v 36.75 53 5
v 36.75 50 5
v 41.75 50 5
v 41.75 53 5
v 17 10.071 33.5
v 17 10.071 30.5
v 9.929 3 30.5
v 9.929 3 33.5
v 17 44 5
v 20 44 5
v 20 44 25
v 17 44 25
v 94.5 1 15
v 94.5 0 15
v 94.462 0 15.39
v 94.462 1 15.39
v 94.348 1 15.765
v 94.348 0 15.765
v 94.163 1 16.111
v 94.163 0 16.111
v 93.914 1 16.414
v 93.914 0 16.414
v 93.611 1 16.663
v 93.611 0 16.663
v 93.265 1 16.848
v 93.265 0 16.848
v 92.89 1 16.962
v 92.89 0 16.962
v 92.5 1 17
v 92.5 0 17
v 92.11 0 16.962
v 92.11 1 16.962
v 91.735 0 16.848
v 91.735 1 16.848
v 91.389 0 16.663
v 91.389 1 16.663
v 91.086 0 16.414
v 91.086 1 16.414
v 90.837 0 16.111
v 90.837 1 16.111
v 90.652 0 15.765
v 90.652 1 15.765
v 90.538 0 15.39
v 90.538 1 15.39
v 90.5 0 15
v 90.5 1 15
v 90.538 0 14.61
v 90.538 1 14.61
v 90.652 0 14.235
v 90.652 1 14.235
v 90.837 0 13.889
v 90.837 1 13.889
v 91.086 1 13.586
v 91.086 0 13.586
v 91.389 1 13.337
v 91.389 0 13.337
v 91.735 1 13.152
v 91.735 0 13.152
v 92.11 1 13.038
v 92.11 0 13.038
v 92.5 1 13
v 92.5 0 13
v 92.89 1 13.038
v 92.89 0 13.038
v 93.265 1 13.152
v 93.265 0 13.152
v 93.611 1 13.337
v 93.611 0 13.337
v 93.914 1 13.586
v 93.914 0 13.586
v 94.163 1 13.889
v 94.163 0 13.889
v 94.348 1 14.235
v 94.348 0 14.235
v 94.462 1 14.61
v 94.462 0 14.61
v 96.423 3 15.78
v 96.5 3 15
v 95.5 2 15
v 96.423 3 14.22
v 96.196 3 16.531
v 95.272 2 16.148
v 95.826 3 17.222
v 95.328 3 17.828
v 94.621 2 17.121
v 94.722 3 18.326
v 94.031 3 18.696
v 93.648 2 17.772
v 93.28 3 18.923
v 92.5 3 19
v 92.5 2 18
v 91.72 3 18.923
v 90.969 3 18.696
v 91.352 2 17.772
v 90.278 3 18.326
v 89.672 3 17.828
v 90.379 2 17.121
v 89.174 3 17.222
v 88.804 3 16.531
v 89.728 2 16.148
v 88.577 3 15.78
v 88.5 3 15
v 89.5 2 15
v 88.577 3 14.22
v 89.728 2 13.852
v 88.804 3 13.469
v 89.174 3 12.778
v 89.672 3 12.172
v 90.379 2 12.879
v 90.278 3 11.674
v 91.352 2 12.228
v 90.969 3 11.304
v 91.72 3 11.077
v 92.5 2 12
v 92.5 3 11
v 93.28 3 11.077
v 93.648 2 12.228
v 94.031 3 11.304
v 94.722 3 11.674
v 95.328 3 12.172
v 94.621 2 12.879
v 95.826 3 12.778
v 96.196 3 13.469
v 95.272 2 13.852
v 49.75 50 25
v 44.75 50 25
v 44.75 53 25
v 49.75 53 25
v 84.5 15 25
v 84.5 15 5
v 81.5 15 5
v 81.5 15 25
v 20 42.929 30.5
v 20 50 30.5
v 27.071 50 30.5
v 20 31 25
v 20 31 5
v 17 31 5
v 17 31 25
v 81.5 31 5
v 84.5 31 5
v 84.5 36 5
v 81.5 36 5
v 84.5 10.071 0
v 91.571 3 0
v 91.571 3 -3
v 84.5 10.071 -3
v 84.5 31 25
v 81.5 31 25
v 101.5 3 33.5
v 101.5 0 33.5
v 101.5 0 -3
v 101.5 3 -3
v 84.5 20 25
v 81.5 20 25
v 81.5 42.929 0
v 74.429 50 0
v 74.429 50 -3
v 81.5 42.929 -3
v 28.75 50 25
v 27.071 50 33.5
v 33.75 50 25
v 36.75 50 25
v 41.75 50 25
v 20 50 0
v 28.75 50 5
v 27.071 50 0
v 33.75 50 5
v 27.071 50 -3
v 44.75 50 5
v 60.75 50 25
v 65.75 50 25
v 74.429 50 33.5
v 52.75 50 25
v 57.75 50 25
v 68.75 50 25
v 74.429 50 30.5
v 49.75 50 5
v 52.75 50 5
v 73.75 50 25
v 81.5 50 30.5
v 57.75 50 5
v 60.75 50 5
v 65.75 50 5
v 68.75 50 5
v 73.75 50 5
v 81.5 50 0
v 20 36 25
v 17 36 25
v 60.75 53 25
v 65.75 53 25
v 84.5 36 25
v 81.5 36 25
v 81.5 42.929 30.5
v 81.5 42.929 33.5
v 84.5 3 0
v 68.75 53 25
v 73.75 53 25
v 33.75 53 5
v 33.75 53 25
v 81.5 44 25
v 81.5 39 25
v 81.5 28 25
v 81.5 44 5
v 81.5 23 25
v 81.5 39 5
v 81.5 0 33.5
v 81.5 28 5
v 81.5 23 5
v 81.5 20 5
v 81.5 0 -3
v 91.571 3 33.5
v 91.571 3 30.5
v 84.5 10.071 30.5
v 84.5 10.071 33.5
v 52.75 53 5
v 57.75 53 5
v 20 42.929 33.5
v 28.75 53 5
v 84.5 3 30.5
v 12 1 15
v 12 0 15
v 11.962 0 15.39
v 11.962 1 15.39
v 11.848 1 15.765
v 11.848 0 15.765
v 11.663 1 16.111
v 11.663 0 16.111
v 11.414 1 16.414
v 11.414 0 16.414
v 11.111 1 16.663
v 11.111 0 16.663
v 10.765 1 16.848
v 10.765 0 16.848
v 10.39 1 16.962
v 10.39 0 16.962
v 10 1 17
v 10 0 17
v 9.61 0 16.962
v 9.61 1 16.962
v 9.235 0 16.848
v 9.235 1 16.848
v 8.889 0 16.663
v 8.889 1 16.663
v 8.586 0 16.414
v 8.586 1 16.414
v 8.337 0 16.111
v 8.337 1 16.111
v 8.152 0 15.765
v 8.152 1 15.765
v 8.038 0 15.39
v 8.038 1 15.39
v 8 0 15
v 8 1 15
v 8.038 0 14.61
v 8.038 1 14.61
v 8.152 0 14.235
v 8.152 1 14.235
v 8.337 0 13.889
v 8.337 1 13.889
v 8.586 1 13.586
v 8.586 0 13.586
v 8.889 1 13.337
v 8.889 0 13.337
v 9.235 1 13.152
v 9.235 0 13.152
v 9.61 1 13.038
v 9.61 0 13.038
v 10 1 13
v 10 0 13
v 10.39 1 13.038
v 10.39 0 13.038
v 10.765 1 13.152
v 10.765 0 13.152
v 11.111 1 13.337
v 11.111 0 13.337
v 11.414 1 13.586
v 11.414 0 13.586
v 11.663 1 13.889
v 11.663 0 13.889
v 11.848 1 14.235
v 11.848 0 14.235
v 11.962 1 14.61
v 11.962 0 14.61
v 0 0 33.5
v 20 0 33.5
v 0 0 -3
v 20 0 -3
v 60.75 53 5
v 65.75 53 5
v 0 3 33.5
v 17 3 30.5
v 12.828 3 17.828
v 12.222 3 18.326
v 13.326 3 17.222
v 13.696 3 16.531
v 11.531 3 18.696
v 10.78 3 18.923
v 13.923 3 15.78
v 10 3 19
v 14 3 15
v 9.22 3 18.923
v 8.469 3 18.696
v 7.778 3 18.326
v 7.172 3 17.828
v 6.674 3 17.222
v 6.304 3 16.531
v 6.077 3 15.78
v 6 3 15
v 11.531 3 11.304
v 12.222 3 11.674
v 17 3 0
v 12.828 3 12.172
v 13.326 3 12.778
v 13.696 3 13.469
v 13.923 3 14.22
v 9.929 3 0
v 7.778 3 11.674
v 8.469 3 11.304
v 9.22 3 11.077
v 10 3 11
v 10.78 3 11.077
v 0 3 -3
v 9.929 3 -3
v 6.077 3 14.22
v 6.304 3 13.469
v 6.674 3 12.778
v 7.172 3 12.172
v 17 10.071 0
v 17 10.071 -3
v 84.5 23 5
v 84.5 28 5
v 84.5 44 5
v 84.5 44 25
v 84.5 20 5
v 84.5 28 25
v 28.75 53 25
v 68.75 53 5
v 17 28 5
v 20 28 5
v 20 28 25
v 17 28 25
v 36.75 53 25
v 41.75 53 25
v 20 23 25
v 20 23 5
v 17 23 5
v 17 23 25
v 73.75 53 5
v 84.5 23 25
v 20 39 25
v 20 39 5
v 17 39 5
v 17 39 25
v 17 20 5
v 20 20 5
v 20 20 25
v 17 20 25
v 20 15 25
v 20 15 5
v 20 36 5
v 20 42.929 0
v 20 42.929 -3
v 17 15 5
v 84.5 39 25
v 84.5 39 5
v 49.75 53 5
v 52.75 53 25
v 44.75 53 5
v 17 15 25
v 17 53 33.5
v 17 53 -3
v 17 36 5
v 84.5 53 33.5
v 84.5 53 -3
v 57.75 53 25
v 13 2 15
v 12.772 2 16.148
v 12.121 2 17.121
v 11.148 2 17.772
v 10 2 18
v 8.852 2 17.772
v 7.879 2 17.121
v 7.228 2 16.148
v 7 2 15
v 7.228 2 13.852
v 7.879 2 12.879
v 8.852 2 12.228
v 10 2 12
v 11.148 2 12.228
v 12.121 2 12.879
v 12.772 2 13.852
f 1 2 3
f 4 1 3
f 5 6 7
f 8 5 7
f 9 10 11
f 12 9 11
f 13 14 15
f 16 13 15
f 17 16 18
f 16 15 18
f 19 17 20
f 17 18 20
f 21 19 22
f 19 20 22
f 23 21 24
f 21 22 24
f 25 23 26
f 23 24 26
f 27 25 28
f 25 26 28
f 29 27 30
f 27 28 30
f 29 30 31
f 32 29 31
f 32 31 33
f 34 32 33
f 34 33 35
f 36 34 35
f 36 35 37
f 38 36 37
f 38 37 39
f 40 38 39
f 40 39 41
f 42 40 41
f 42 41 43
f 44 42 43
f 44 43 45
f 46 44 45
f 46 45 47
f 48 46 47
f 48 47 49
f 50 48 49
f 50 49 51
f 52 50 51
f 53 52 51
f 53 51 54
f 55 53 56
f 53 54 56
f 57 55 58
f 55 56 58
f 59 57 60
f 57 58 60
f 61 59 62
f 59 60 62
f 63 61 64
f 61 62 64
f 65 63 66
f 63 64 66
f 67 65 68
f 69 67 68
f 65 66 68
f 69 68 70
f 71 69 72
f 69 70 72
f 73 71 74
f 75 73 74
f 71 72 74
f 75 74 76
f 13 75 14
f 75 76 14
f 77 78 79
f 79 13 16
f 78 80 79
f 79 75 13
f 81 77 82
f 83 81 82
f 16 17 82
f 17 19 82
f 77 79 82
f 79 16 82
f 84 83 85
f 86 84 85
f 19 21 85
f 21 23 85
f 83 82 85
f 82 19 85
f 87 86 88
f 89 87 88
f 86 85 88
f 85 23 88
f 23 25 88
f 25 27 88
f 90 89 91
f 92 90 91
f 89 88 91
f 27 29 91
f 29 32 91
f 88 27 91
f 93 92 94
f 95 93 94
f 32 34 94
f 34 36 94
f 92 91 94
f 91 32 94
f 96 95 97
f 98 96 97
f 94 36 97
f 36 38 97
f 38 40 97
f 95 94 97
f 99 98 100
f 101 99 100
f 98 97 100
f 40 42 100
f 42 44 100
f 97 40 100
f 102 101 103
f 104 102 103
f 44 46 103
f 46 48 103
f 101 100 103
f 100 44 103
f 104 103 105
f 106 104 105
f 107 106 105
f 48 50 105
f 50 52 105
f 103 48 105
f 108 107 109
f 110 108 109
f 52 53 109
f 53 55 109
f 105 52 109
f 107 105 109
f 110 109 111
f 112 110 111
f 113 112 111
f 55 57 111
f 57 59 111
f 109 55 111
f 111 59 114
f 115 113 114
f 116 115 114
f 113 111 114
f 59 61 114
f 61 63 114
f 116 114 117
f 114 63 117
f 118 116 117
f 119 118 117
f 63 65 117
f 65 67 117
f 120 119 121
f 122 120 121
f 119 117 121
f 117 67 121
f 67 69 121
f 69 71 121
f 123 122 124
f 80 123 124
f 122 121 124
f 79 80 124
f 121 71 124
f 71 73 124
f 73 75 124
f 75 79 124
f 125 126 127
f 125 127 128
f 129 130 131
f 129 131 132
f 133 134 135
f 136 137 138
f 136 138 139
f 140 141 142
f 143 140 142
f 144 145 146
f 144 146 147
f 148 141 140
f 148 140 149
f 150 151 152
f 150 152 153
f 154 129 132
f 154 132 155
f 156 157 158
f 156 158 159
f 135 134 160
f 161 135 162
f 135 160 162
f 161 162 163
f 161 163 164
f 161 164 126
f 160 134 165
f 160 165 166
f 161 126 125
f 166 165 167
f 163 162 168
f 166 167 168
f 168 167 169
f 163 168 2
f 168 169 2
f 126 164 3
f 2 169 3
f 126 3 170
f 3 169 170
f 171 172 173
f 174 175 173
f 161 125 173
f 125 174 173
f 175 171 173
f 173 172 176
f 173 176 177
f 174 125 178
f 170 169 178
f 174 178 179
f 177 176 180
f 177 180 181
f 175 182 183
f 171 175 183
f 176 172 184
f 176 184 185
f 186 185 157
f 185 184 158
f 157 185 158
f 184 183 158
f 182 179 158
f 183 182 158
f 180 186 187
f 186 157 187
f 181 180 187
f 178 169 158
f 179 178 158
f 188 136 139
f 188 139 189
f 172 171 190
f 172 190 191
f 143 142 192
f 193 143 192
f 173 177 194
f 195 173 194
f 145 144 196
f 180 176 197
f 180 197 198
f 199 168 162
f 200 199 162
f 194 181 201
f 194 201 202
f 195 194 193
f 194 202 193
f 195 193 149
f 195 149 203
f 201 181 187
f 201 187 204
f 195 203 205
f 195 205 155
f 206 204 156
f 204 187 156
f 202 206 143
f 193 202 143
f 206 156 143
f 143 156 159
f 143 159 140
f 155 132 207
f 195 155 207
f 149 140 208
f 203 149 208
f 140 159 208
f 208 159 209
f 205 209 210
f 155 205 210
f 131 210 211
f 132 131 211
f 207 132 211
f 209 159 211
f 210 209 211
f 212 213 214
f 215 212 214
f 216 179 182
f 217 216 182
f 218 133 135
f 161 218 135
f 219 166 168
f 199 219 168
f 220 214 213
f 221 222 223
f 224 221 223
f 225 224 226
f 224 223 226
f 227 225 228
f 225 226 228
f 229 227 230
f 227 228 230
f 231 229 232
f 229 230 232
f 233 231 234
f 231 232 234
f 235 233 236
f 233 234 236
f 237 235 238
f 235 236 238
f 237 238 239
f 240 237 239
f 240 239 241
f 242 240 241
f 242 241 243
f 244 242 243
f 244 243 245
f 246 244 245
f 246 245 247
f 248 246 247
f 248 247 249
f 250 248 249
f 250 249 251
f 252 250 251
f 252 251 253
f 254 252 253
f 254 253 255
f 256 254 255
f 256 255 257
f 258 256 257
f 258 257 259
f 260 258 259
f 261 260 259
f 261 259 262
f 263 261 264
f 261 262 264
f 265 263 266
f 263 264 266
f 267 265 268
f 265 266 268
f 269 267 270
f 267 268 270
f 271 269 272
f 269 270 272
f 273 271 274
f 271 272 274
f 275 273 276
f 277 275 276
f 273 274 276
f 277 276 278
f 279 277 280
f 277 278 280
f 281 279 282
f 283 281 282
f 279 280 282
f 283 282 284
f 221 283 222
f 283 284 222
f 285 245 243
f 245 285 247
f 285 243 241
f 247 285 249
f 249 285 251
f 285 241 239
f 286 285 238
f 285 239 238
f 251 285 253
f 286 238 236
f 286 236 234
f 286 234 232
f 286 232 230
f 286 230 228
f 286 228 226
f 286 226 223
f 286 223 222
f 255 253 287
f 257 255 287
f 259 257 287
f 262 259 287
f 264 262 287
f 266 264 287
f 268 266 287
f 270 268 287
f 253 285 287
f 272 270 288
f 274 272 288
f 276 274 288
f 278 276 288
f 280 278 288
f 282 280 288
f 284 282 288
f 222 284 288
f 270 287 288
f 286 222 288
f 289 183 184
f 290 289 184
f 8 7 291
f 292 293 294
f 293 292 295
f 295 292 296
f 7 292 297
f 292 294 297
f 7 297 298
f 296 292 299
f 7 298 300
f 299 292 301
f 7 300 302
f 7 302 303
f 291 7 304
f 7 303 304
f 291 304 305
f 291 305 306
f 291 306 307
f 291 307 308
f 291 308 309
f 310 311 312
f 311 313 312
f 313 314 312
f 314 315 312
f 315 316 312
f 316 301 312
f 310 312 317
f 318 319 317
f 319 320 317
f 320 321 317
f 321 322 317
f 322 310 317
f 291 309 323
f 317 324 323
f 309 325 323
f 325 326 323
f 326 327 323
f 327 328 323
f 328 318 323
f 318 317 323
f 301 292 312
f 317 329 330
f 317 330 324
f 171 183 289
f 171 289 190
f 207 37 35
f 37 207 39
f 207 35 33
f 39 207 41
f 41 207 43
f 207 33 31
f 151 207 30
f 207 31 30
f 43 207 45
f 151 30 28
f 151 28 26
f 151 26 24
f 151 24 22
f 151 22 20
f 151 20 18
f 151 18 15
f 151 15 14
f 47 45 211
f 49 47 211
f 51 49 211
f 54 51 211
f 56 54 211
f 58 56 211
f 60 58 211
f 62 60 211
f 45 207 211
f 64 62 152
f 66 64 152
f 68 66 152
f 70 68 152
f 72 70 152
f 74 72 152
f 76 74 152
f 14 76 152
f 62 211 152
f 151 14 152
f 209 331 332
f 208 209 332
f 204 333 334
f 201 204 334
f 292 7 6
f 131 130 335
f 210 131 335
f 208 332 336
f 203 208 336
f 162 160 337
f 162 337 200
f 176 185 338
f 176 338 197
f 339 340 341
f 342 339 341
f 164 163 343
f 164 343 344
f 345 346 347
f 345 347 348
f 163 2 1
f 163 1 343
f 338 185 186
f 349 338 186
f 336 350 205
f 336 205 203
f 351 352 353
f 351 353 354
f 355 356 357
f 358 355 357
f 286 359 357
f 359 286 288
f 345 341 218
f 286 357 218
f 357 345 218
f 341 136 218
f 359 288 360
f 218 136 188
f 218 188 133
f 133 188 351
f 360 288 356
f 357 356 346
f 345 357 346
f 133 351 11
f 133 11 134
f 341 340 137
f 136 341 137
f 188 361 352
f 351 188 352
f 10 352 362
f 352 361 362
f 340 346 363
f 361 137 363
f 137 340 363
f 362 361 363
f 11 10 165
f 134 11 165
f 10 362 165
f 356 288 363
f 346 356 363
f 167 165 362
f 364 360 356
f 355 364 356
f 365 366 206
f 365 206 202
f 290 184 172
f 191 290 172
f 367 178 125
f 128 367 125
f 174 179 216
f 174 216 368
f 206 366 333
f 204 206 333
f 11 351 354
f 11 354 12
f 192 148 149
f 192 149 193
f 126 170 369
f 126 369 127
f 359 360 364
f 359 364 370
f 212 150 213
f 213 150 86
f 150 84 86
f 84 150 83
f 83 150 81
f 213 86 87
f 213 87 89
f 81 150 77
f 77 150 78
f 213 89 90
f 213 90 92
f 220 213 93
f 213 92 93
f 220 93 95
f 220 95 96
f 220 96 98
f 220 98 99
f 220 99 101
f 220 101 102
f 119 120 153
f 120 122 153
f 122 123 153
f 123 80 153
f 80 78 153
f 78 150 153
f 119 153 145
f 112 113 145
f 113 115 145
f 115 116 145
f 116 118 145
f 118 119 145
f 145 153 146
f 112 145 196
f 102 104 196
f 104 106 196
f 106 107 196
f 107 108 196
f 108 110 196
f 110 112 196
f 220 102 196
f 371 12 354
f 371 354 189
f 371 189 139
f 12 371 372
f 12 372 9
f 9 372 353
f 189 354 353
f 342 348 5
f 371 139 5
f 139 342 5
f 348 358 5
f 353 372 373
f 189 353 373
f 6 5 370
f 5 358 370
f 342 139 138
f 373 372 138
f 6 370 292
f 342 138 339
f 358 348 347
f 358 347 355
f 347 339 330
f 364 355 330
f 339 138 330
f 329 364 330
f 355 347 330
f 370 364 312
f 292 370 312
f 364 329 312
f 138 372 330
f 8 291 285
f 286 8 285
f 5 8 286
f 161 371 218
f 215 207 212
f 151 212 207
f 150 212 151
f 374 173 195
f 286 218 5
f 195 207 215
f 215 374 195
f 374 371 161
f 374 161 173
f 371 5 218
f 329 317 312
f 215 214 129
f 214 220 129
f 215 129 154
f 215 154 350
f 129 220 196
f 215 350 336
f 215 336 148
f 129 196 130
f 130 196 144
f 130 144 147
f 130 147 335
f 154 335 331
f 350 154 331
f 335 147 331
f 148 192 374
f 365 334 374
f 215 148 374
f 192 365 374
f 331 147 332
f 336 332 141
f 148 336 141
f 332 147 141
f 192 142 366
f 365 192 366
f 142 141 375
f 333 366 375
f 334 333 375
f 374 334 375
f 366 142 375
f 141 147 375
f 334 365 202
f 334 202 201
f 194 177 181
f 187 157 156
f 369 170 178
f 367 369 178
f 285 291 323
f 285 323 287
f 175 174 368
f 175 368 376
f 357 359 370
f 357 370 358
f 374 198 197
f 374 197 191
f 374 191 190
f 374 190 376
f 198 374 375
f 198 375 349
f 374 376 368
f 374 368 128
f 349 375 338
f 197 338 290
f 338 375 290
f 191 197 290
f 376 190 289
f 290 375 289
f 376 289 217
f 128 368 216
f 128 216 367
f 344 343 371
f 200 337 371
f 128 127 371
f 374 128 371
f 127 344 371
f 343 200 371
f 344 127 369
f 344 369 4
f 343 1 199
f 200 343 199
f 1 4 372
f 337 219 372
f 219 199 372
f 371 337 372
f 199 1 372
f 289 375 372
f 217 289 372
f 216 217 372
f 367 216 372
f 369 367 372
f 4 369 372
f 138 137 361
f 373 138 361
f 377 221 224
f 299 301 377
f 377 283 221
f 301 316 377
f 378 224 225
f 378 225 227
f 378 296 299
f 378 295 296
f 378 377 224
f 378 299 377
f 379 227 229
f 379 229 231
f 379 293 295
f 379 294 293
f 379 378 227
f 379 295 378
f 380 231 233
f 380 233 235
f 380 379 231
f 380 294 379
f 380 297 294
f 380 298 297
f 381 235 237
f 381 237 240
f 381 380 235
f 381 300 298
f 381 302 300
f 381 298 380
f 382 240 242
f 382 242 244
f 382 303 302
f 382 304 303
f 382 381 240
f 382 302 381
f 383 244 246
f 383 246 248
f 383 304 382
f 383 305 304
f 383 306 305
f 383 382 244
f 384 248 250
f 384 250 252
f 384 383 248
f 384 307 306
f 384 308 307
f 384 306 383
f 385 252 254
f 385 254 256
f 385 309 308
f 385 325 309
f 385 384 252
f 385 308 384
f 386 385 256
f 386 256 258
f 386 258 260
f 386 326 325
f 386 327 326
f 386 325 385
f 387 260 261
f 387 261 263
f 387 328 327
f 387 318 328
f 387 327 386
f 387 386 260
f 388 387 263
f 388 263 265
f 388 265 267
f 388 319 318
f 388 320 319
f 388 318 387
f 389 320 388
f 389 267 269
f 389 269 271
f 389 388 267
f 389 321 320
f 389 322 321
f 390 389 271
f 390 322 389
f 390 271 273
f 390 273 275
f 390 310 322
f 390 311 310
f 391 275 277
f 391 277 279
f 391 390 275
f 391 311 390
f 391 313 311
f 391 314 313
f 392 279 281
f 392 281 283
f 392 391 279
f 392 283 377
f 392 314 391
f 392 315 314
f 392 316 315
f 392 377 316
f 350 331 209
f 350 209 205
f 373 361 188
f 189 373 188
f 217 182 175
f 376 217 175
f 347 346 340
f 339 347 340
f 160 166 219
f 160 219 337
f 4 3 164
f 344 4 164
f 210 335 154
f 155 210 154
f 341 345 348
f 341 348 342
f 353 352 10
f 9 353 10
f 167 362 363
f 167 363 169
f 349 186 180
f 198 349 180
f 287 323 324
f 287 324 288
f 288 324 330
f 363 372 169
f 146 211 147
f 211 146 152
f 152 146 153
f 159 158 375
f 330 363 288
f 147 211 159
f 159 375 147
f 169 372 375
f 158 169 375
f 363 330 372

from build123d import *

# Parameters (mm, degrees)
PAD_DEPTH       = 30.5
SKETCH001_R     = 2
SKETCH001_W     = 5
SKETCH001_H     = 20
POCKET_DEPTH    = 53.001
CHAMFER_SIZE    = 2
PAD001_DEPTH    = 3
PAD002_DEPTH    = 3
SKETCH004_W     = 5
SKETCH004_H     = 20
POCKET001_DEPTH = 84.501


with BuildPart() as part:
    # Sketch → Pad (new body)
    with BuildSketch(Plane.XY):
        Polygon((0, 0), (20, 0), (20, 50), (81.5, 50), (81.5, 0), (101.5, 0), (101.5, 3), (84.5, 3), (84.5, 53), (17, 53), (17, 3), (0, 3), align=None)
    extrude(amount=PAD_DEPTH)

    # Sketch001 (on Face1 of Pad) → Pocket (cut, through all)
    with BuildSketch(Plane.XZ):
        with Locations((10, 15)):
            Circle(SKETCH001_R)
        with Locations((92.5, 15)):
            Circle(SKETCH001_R)
        with Locations((31.25, 15)):
            Rectangle(SKETCH001_W, SKETCH001_H)
        with Locations((71.25, 15)):
            Rectangle(SKETCH001_W, SKETCH001_H)
        with Locations((63.25, 15)):
            Rectangle(SKETCH001_W, SKETCH001_H)
        with Locations((39.25, 15)):
            Rectangle(SKETCH001_W, SKETCH001_H)
        with Locations((47.25, 15)):
            Rectangle(SKETCH001_W, SKETCH001_H)
        with Locations((55.25, 15)):
            Rectangle(SKETCH001_W, SKETCH001_H)
    extrude(amount=-POCKET_DEPTH, mode=Mode.SUBTRACT)

    # Chamfer
    chamfer_edges = [part.edges().sort_by_distance(p)[0] for p in [
        (90.5, 3, 15),
        (8, 3, 15),
    ]]
    chamfer(chamfer_edges, length=CHAMFER_SIZE)

    # Sketch003 (on Face6 of Chamfer) → Pad001 (join)
    with BuildSketch(Plane.XY):
        Polygon((0, 0), (20, 0), (20, 42.928932), (27.071068, 50), (74.428932, 50), (81.5, 42.928932), (81.5, 0), (101.5, 0), (101.5, 3), (91.571068, 3), (84.5, 10.071068), (84.5, 53), (17, 53), (17, 10.071068), (9.928932, 3), (0, 3), align=None)
    extrude(amount=-PAD001_DEPTH)

    # Sketch002 (on Face7 of Pad001) → Pad002 (join)
    with BuildSketch(Plane.XY.offset(30.5)):
        Polygon((0, 0), (20, 0), (20, 42.928932), (27.071068, 50), (74.428932, 50), (81.5, 42.928932), (81.5, 0), (101.5, 0), (101.5, 3), (91.571068, 3), (84.5, 10.071068), (84.5, 53), (17, 53), (17, 10.071068), (9.928932, 3), (0, 3), align=None)
    extrude(amount=PAD002_DEPTH)

    # Sketch004 (on Face75 of Pad002) → Pocket001 (cut, through all)
    with BuildSketch(Plane.YZ.offset(84.5)):
        with Locations((17.5, 15)):
            Rectangle(SKETCH004_W, SKETCH004_H)
        with Locations((25.5, 15)):
            Rectangle(SKETCH004_W, SKETCH004_H)
        with Locations((33.5, 15)):
            Rectangle(SKETCH004_W, SKETCH004_H)
        with Locations((41.5, 15)):
            Rectangle(SKETCH004_W, SKETCH004_H)
    extrude(amount=-POCKET001_DEPTH, mode=Mode.SUBTRACT)


solid = part.part
